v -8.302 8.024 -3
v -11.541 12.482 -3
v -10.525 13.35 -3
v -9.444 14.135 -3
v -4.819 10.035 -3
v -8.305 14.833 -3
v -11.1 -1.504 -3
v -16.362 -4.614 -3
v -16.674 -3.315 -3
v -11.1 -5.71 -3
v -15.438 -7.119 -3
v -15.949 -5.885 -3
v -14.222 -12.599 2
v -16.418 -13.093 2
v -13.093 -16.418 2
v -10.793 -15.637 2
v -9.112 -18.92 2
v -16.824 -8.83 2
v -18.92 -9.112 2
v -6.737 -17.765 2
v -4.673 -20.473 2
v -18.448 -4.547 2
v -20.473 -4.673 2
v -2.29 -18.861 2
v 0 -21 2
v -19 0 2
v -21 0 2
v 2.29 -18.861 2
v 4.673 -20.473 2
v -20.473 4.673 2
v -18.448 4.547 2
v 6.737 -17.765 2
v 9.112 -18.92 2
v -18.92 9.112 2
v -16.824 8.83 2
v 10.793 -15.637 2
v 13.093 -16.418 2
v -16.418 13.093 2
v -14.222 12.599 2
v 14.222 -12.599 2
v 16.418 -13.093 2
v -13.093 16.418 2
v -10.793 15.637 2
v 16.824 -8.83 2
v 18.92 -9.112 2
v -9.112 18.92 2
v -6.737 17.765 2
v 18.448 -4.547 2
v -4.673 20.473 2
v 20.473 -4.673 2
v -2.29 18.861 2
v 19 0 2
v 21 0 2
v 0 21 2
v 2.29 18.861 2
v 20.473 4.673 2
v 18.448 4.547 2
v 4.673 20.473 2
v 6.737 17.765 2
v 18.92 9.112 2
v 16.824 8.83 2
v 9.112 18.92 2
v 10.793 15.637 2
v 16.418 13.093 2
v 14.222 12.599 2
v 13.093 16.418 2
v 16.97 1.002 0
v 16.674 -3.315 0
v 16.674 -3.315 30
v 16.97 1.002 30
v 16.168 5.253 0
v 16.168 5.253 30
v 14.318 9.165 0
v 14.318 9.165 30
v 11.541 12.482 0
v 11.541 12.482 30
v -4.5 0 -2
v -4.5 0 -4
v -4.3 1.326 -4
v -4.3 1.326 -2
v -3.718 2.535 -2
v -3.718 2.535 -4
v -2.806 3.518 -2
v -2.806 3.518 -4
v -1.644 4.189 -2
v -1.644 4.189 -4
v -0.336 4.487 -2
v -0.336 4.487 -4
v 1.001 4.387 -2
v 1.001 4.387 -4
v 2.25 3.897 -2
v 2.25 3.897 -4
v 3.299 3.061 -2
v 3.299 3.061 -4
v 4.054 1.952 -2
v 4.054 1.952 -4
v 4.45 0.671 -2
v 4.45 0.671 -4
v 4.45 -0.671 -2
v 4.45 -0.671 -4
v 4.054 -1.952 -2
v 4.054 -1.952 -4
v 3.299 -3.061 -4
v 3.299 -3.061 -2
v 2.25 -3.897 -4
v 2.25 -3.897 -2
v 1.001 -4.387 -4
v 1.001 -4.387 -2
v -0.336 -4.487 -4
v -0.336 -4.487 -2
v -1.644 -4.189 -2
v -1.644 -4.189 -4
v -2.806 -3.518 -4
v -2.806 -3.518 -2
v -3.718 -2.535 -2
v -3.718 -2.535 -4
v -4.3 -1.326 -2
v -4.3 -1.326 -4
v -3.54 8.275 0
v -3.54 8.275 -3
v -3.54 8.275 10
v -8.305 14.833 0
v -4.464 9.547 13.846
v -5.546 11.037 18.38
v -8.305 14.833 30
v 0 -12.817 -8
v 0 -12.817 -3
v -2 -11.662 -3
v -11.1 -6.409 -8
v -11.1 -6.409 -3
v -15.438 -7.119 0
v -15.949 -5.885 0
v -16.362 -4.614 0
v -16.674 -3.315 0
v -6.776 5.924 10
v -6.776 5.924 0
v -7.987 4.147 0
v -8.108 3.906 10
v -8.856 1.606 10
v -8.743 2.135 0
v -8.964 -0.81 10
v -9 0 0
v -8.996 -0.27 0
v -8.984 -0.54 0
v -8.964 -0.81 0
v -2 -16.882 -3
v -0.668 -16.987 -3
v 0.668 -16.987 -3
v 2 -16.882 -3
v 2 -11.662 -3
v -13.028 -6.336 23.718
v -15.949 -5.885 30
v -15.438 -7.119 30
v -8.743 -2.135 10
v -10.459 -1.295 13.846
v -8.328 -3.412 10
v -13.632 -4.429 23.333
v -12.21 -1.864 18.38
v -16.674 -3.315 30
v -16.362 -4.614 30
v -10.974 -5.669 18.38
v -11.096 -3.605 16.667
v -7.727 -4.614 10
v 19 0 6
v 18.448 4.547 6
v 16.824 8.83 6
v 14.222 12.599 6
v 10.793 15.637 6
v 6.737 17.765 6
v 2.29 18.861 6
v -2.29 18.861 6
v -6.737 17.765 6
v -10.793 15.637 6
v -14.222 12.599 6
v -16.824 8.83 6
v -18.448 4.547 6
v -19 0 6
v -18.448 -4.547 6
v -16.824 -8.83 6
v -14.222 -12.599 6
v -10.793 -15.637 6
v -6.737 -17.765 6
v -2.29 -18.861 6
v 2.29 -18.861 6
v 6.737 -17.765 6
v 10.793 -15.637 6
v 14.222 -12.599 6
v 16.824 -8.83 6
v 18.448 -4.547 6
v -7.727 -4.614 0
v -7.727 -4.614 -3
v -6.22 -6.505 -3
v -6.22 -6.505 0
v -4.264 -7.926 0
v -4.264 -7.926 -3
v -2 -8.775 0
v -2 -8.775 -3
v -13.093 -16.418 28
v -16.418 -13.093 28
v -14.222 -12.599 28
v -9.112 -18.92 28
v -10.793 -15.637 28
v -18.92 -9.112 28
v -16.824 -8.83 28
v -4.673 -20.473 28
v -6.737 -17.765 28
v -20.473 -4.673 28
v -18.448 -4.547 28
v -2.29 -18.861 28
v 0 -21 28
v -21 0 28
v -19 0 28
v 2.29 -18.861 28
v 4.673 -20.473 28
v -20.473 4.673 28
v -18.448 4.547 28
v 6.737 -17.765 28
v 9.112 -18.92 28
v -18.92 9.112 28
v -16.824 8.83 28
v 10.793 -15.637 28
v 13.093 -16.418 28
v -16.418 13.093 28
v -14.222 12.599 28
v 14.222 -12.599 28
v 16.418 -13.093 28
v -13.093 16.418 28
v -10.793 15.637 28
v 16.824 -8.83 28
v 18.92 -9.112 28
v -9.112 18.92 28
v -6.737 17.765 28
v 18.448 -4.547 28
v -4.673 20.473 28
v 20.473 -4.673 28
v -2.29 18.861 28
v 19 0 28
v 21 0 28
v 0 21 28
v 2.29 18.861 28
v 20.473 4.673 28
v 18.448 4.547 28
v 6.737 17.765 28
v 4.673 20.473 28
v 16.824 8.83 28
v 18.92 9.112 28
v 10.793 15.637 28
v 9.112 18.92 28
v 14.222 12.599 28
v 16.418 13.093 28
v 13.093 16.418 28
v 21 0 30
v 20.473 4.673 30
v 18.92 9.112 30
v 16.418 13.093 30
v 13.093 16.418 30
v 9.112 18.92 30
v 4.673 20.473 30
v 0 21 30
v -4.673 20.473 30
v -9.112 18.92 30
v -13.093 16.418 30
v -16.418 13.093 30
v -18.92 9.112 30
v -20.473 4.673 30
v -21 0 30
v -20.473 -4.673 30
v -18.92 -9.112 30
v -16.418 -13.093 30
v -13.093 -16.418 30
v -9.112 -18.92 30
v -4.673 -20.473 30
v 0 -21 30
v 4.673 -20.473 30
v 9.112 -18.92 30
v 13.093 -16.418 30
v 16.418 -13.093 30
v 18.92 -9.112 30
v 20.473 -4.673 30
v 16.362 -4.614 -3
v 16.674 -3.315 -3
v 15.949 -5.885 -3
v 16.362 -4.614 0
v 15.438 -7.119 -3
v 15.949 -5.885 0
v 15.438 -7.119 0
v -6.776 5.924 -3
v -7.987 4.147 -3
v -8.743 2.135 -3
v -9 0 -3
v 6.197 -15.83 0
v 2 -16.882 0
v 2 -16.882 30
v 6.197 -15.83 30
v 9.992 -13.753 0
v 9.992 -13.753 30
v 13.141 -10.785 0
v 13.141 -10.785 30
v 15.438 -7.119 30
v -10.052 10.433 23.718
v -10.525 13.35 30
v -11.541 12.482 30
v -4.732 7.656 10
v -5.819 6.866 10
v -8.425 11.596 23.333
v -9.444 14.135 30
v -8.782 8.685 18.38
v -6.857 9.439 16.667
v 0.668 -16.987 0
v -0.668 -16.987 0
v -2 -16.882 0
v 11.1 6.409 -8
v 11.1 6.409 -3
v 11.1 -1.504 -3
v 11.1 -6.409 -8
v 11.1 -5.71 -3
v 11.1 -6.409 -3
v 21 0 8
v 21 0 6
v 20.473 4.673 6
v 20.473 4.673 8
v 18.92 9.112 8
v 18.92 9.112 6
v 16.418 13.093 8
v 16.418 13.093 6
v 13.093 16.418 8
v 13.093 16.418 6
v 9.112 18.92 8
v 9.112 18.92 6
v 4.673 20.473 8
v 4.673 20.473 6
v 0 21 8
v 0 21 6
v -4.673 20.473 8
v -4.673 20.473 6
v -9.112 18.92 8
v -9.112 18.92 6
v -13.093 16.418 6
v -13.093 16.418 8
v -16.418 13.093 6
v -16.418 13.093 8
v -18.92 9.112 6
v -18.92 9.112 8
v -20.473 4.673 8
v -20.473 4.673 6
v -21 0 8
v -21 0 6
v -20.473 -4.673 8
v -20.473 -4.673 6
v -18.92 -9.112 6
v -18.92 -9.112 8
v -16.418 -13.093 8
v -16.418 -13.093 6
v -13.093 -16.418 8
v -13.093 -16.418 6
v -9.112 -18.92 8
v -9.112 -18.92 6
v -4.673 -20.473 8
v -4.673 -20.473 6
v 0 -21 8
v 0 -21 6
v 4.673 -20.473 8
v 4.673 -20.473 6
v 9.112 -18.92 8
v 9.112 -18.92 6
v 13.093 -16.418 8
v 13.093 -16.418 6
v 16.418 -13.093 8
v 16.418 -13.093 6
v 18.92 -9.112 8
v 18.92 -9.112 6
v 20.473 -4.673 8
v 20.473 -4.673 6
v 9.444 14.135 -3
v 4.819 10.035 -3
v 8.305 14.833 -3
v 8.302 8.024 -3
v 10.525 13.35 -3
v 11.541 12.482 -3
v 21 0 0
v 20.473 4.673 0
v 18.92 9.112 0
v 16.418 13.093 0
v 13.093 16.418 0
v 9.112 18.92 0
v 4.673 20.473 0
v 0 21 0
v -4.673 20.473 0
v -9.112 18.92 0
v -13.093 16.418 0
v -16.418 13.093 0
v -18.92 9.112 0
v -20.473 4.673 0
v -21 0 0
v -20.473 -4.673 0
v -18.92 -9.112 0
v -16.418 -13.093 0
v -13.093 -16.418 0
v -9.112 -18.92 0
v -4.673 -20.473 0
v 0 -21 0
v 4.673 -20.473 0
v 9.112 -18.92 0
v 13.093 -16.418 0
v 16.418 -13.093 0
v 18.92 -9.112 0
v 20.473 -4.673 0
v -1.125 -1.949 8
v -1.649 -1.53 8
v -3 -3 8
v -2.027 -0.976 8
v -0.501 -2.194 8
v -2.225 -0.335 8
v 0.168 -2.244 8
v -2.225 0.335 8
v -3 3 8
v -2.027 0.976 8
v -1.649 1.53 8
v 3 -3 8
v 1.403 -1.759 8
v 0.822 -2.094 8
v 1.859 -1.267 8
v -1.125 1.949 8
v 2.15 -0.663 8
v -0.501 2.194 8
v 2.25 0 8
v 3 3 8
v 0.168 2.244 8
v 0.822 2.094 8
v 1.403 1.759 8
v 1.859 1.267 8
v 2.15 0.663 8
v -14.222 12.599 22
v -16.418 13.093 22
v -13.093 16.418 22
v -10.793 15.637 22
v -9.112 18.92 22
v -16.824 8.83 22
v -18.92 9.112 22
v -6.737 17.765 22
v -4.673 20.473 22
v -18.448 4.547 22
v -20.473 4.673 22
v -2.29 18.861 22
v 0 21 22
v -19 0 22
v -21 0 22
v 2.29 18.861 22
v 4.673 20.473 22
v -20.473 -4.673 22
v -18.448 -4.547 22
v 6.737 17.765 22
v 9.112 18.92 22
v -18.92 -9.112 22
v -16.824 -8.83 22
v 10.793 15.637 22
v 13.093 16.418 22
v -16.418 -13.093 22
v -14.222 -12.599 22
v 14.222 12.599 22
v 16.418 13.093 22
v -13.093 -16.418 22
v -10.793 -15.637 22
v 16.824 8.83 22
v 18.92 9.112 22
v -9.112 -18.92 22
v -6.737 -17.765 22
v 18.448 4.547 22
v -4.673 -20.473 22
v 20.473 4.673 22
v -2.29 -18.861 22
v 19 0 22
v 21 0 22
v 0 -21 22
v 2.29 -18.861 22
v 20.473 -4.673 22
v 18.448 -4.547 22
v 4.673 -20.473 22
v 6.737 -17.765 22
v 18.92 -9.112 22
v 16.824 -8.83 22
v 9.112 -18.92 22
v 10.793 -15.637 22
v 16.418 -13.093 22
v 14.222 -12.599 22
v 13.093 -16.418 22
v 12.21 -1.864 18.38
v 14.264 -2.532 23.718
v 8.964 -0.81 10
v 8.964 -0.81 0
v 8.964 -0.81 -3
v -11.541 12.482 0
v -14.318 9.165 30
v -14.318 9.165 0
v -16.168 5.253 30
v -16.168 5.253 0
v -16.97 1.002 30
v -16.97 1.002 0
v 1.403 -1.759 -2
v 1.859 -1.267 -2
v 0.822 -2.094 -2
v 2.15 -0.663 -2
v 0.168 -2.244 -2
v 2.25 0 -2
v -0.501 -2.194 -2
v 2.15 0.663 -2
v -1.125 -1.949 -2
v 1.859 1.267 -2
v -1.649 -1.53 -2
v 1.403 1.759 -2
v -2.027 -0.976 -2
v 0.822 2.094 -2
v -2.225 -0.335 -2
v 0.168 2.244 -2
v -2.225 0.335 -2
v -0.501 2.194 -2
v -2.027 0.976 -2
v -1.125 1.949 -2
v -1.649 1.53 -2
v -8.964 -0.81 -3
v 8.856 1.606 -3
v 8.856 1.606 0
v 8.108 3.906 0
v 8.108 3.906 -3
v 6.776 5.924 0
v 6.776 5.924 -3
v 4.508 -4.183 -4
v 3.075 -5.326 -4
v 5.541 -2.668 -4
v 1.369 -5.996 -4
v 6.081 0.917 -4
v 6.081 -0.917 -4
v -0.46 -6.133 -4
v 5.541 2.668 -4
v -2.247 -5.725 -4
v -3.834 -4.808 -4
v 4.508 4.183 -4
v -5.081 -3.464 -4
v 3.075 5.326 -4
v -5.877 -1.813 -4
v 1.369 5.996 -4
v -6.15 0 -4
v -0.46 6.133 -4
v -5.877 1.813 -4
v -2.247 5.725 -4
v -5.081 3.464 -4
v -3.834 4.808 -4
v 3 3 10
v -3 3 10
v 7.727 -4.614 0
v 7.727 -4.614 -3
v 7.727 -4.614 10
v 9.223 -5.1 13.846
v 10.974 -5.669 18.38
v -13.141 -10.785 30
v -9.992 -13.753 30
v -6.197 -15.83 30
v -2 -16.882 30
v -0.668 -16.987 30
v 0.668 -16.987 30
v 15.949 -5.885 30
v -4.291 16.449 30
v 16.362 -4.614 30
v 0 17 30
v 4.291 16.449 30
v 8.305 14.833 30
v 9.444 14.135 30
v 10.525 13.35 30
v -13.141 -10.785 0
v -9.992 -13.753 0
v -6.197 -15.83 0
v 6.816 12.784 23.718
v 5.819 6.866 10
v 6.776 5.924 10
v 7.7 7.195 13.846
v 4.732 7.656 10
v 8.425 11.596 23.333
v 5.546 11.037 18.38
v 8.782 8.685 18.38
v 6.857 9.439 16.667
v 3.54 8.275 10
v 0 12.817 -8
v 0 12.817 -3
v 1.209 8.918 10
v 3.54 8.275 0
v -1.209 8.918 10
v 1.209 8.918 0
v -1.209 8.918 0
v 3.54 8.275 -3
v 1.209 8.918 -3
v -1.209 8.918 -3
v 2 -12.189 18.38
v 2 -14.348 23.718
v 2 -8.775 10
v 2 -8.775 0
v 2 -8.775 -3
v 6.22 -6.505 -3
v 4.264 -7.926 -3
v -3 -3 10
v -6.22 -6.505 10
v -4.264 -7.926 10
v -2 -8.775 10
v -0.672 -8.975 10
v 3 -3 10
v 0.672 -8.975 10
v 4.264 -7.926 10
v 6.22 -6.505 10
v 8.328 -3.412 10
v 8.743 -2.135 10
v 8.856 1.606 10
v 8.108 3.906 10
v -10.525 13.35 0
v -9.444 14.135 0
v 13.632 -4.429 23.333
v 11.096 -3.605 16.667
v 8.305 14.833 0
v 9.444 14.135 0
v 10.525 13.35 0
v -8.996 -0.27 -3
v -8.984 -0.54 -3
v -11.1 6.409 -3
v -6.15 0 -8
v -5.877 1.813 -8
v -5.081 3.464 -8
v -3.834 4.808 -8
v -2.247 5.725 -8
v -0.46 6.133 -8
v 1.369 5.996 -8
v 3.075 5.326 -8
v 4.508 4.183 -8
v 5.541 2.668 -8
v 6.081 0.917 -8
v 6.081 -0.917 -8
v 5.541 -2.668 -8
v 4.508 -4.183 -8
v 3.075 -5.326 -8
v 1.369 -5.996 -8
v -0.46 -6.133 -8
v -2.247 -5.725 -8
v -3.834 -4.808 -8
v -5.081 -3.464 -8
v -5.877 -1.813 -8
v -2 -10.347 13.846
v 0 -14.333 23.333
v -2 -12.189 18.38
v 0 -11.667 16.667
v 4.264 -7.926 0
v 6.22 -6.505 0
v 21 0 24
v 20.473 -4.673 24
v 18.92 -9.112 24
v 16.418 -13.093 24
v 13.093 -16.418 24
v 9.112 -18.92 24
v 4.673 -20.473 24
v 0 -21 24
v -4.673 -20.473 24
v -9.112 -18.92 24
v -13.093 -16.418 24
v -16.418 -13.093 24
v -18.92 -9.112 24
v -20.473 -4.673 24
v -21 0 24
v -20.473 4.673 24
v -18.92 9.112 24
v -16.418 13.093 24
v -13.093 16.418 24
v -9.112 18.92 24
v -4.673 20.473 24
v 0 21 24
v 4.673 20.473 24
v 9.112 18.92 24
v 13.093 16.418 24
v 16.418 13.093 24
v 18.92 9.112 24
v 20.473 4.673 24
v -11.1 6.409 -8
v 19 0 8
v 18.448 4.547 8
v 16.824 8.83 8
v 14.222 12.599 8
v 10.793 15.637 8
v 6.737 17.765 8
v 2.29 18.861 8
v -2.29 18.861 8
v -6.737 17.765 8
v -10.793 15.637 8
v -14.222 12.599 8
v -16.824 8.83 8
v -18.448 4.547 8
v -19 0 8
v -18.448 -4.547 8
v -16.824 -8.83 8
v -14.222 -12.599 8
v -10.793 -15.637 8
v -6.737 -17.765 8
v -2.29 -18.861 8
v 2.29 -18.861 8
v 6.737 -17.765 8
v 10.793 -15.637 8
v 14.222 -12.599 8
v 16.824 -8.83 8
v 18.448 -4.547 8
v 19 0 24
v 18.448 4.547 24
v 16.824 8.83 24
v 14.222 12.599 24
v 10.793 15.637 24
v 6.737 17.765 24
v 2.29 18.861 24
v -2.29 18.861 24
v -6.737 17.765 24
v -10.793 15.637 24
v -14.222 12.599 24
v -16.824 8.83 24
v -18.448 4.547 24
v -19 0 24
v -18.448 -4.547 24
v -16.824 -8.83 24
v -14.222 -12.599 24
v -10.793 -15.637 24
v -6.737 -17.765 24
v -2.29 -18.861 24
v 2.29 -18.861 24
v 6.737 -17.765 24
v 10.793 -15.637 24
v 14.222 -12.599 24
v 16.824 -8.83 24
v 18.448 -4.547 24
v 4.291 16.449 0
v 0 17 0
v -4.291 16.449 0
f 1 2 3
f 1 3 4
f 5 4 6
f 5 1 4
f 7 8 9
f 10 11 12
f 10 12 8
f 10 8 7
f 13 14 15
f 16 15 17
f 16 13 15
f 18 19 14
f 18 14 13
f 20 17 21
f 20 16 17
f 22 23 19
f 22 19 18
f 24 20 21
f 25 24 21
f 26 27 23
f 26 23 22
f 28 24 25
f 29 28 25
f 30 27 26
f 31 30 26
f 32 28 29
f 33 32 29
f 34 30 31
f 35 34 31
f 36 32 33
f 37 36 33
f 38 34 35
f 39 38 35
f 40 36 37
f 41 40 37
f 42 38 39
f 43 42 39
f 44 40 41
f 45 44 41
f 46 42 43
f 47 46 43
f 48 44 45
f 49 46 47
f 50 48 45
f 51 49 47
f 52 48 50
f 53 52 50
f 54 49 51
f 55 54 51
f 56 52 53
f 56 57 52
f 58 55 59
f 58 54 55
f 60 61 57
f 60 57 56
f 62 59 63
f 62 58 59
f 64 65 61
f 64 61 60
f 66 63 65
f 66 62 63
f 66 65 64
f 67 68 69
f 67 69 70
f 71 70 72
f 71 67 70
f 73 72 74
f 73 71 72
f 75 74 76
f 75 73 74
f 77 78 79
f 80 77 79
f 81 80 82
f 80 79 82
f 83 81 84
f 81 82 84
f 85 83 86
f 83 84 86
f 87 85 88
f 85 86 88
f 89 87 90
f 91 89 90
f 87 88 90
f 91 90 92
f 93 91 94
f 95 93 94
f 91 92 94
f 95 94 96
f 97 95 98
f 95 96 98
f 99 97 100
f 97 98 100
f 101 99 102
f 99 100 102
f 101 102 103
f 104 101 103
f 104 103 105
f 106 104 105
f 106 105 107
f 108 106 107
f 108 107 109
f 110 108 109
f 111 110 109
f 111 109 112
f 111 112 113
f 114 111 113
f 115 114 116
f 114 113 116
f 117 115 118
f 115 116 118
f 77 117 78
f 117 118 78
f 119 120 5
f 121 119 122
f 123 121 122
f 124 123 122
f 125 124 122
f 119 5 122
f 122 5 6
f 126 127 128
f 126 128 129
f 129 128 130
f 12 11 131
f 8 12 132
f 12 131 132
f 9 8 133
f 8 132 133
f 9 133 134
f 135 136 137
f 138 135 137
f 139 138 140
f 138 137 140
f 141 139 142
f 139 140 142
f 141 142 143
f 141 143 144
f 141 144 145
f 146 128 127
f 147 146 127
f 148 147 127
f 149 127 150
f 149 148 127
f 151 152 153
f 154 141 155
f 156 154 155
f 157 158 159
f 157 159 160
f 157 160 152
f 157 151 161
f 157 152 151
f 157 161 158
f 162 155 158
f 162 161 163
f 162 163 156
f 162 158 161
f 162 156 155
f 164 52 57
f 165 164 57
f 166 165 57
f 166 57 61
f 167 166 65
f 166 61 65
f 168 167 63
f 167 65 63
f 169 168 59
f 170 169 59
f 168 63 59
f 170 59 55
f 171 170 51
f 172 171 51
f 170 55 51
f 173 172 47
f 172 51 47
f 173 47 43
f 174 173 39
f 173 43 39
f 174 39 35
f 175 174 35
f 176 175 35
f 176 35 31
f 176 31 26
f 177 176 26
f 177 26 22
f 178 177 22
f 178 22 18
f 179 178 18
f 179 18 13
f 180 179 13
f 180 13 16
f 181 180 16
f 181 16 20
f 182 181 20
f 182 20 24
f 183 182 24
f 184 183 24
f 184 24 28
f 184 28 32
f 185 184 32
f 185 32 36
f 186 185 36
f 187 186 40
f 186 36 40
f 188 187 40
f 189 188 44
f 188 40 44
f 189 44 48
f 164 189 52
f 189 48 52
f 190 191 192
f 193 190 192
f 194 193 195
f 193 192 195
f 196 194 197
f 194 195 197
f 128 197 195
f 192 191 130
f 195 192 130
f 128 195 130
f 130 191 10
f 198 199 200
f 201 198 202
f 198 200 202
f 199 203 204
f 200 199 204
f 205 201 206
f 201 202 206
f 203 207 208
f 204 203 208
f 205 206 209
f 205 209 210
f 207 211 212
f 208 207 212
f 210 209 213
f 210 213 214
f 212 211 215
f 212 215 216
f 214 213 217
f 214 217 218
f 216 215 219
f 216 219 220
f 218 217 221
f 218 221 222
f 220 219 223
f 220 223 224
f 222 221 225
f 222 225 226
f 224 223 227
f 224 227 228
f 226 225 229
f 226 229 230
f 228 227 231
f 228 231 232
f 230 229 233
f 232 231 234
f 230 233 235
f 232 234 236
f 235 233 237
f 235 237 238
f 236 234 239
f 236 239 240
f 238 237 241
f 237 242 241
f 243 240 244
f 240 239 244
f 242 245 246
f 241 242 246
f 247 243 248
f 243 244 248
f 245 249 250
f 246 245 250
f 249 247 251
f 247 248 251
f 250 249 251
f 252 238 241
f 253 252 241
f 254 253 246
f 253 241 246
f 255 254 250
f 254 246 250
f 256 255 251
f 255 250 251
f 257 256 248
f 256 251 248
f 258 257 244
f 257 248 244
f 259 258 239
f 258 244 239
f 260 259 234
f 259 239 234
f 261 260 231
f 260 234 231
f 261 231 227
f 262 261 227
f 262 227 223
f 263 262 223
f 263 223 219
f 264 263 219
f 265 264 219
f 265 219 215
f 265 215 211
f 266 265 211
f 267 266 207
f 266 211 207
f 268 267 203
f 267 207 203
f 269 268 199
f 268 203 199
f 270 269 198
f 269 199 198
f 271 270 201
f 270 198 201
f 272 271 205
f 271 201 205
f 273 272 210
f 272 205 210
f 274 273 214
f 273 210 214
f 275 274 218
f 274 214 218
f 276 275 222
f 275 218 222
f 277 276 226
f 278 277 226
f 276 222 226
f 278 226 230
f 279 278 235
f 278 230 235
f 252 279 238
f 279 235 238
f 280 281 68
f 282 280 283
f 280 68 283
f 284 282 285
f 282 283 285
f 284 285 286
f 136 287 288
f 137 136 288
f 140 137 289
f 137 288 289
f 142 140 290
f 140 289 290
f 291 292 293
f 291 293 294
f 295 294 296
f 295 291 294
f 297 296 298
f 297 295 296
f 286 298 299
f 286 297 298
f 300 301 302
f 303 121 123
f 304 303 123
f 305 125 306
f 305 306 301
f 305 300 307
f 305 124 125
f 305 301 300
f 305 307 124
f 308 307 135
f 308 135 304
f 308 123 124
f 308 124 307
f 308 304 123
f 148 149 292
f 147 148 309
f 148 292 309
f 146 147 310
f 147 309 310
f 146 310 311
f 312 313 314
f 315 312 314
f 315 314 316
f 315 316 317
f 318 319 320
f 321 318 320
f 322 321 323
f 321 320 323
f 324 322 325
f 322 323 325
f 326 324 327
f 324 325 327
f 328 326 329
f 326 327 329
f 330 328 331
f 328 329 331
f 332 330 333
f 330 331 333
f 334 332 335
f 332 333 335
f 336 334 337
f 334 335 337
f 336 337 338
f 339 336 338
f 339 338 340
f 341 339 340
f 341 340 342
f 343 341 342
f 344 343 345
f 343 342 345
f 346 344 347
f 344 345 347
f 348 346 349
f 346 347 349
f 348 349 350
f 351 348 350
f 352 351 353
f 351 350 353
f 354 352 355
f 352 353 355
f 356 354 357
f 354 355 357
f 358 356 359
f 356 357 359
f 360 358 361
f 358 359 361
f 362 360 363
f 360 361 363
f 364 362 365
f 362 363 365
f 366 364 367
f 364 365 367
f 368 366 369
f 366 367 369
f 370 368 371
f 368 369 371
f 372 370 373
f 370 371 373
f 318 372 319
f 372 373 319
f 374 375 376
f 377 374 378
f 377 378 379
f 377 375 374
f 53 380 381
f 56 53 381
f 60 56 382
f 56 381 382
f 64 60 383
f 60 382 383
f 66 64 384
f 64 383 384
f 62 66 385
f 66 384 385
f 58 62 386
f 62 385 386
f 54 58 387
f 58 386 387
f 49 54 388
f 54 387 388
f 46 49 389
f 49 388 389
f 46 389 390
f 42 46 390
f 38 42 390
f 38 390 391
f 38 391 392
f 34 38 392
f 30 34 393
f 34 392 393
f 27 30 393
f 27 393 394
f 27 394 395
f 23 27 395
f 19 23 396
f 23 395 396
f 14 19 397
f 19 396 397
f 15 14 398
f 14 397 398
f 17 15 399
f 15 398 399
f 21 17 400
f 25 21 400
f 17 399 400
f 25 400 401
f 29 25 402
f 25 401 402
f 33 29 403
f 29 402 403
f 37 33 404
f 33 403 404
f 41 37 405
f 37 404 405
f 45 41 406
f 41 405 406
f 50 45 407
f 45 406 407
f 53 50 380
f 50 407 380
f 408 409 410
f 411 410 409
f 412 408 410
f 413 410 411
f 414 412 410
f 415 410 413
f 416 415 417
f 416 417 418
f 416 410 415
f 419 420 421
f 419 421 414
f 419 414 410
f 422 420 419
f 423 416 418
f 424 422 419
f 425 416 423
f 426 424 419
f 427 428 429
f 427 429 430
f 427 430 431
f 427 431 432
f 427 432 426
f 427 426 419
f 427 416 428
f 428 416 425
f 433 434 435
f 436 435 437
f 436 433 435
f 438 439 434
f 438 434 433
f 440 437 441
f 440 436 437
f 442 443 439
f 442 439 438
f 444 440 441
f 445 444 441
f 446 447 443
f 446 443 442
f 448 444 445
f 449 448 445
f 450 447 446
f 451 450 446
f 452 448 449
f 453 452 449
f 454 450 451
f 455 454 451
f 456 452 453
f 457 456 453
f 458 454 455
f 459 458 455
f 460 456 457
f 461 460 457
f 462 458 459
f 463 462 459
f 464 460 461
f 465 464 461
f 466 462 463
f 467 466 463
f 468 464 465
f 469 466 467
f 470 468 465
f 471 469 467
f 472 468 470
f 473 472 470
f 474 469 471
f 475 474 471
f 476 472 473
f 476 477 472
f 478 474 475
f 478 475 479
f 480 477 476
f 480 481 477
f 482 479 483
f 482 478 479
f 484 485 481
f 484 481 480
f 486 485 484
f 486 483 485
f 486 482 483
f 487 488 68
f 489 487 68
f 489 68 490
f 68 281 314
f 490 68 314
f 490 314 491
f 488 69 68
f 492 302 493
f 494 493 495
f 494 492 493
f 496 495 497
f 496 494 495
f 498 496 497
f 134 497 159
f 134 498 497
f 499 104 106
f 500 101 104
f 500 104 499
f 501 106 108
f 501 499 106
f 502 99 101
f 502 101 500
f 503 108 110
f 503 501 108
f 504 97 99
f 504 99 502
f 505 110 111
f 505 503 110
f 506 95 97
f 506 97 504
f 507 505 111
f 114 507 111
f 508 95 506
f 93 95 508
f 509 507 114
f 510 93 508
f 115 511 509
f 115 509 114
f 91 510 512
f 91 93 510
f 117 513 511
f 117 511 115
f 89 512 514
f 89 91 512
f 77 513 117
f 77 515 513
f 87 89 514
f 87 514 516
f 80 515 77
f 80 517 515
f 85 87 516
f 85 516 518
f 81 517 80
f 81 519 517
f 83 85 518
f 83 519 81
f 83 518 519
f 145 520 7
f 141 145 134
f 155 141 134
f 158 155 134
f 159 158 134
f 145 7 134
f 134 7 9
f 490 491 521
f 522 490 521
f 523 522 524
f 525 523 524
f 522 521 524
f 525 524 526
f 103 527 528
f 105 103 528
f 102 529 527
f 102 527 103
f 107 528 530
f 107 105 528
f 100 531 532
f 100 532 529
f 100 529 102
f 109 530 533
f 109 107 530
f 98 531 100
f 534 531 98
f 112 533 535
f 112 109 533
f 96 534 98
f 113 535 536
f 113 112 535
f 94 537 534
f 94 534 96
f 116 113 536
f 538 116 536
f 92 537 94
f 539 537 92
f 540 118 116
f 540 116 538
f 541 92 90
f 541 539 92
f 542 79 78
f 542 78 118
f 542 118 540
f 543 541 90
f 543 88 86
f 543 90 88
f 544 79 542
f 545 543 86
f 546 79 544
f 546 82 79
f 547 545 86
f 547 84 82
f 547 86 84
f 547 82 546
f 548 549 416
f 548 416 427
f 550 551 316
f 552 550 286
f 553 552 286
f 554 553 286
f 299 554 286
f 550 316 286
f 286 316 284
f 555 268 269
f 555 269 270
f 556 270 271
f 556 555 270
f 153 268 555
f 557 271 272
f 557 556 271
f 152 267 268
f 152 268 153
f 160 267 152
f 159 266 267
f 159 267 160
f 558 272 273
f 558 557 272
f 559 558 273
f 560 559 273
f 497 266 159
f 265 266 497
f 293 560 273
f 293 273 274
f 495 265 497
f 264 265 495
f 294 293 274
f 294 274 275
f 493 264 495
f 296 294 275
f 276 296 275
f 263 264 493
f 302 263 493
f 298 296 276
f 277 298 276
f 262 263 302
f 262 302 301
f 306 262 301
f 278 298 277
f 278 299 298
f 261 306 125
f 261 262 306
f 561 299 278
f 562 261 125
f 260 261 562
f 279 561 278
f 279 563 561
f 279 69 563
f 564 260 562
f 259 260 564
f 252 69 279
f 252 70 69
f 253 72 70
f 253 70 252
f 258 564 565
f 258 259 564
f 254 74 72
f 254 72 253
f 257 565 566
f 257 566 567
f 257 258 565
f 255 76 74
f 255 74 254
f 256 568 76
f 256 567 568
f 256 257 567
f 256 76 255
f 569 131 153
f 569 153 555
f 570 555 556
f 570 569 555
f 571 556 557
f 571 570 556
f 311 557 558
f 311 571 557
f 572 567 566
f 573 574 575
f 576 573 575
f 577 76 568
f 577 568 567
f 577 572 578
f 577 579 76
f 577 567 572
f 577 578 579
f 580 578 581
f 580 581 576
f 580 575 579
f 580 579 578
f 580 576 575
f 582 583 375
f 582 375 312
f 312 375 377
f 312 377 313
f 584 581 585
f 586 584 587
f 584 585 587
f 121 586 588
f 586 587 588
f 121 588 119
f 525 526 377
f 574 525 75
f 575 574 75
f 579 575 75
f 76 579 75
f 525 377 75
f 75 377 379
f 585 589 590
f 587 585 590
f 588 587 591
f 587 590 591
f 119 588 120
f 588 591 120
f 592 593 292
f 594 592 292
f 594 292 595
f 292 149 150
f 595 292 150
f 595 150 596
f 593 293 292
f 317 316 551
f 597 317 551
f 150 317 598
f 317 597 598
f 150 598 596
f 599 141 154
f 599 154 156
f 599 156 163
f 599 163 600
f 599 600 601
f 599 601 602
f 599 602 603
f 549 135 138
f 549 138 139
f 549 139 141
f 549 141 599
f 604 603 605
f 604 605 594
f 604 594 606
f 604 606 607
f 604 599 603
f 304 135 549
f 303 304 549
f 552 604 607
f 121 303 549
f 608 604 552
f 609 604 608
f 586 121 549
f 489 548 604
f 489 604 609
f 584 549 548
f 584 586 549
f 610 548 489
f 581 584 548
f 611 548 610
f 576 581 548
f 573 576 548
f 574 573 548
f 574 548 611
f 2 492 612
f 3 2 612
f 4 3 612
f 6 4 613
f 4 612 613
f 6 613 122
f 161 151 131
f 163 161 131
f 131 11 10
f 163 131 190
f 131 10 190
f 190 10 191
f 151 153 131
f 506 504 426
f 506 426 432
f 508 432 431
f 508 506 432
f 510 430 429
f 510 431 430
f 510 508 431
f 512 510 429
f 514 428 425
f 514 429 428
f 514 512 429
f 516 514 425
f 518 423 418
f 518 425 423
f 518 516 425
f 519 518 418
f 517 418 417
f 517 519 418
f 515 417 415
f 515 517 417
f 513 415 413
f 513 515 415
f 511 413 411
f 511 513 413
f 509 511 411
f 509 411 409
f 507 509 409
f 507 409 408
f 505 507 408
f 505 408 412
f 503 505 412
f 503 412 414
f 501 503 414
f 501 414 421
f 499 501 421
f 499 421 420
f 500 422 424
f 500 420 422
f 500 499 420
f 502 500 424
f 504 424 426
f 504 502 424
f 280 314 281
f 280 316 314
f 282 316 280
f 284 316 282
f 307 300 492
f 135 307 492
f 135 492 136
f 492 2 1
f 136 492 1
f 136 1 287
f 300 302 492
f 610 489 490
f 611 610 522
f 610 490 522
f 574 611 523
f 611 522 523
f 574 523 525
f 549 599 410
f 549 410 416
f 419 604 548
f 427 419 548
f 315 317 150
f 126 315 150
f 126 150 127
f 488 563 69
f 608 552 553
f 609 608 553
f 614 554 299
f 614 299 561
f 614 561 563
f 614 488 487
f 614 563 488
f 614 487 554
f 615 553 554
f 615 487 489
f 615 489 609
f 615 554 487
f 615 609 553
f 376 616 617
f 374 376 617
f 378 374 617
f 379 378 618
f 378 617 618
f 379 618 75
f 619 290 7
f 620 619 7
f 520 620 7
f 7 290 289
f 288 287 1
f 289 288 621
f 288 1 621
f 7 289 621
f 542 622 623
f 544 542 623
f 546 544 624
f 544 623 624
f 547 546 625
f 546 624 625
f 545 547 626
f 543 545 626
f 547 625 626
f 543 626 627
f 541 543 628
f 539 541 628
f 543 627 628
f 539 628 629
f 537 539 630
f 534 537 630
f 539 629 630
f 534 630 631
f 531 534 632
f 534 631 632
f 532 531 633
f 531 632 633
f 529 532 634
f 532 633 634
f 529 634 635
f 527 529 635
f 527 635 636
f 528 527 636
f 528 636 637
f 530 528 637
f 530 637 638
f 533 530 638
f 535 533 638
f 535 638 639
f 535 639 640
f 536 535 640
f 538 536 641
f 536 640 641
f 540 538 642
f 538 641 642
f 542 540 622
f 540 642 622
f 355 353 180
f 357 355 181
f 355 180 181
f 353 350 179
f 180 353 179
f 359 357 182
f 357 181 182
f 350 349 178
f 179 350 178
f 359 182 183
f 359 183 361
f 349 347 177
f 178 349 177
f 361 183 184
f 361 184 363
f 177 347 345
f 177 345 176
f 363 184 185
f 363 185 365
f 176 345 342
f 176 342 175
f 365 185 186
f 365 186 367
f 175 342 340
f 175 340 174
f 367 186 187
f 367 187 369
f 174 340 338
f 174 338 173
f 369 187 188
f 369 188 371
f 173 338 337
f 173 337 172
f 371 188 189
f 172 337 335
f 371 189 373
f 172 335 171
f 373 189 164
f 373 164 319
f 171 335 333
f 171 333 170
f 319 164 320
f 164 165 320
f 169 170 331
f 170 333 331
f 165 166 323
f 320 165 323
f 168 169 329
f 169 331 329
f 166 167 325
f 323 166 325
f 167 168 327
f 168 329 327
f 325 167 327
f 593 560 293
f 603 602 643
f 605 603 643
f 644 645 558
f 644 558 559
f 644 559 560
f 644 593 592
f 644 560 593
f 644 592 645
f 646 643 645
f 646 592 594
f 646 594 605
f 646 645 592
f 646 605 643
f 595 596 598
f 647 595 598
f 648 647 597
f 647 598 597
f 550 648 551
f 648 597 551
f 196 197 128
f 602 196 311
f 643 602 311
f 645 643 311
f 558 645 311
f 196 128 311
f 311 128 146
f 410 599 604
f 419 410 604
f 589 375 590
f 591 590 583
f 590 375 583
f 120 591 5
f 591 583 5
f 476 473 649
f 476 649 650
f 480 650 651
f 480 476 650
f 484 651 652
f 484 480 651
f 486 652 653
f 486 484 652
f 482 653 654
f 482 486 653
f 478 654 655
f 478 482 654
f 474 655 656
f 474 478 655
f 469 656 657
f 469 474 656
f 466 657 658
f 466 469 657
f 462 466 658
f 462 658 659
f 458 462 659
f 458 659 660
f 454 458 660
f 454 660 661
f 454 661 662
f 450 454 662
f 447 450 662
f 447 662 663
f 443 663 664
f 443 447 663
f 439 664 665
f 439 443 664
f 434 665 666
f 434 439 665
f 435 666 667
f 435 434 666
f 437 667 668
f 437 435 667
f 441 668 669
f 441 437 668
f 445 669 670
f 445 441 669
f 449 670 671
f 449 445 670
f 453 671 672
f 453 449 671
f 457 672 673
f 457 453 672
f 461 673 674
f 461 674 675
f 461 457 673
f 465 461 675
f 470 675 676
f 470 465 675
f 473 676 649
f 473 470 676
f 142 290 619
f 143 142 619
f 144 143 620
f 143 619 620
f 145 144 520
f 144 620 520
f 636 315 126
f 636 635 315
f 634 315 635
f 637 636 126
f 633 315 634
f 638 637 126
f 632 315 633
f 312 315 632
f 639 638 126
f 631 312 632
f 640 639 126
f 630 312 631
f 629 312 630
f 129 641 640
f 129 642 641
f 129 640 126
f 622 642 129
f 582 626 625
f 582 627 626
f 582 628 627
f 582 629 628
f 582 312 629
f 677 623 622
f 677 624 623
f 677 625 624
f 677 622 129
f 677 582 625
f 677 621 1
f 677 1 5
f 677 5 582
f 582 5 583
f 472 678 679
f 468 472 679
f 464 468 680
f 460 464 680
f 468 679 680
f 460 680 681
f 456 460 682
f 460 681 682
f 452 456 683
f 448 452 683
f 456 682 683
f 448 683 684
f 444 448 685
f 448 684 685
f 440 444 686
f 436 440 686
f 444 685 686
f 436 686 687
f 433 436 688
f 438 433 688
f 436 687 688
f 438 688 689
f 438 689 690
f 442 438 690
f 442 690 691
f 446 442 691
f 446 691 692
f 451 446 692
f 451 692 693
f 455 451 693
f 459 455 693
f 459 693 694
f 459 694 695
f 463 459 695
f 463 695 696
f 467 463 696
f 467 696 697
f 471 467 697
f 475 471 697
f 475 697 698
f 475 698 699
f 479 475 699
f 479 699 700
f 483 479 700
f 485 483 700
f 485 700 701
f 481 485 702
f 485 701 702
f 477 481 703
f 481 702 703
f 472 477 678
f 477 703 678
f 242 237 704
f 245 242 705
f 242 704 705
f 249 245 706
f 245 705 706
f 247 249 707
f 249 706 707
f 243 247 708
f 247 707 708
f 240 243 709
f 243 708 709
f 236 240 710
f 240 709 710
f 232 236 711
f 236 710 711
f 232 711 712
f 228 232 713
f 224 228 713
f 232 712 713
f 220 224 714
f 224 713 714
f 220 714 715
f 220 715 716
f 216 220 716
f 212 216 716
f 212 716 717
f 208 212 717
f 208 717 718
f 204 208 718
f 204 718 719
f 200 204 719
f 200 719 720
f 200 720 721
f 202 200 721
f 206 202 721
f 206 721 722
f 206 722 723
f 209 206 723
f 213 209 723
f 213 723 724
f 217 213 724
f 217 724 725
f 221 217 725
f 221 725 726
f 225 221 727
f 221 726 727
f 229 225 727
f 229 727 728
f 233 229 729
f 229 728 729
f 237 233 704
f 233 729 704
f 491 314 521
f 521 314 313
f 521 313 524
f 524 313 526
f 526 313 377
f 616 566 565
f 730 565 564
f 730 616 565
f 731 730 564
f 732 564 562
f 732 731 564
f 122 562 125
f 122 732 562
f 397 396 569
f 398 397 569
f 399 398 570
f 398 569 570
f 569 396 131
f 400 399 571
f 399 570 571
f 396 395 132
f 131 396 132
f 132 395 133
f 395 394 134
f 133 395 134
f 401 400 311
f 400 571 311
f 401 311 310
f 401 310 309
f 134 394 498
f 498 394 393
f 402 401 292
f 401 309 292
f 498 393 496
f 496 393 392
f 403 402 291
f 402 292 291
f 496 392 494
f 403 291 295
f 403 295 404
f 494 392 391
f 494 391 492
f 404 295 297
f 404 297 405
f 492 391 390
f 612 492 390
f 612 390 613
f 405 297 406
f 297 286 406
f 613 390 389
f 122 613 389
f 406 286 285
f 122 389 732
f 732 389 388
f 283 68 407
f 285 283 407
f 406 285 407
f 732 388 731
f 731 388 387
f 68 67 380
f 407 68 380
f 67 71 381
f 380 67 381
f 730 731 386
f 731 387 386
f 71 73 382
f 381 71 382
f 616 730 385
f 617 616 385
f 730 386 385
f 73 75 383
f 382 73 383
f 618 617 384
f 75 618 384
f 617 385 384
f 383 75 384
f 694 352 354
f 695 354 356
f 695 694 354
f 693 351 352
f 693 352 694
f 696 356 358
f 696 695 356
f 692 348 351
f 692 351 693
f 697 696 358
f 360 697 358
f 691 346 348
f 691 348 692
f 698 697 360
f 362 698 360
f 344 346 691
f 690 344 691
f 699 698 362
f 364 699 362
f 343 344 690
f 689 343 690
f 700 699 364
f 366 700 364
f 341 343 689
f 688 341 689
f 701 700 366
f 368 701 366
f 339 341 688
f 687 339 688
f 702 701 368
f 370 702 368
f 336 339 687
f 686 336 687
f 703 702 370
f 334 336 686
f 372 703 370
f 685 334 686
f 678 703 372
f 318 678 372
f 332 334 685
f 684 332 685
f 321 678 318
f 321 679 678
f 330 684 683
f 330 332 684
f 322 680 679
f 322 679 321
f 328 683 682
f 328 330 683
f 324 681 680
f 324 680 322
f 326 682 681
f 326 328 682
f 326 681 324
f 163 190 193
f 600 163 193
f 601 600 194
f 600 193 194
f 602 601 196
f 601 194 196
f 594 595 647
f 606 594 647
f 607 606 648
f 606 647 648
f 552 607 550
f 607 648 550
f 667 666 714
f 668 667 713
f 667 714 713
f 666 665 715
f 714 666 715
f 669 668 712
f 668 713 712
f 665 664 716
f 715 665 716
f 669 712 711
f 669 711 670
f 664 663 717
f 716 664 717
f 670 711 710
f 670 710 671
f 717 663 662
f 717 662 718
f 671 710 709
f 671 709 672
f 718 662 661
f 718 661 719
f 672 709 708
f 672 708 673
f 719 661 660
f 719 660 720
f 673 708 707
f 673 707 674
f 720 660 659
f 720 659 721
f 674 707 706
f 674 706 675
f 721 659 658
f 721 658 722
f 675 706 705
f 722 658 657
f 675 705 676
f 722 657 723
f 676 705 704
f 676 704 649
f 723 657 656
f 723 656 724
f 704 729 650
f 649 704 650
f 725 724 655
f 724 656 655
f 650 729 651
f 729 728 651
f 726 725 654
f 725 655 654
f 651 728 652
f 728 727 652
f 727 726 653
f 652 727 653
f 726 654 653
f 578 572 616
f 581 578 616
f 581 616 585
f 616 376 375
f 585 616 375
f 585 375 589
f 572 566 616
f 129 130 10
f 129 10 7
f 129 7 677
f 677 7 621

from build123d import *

# Parameters (mm, degrees)
SKETCH_1_R           = 19
SKETCH_1_R_2         = 17
EXTRUDE_1_DEPTH      = 30
SKETCH_16_R          = 17
EXTRUDE_9_DEPTH      = 3
SKETCH_4_R           = 9
EXTRUDE_2_DEPTH      = 10
CUT_EXTRUDE_8_DEPTH  = 10
EXTRUDE_10_DEPTH     = 30
SKETCH_6_R           = 2.25
CUT_EXTRUDE_9_DEPTH  = 70
SKETCH_9_R           = 21
SKETCH_9_R_2         = 19
EXTRUDE_4_DEPTH      = 2
SKETCH_10_R          = 21
SKETCH_10_R_2        = 19
EXTRUDE_5_DEPTH      = 2
EXTRUDE_START        = -2
SKETCH_11_R          = 21
SKETCH_11_R_2        = 19
EXTRUDE_6_DEPTH      = 2
EXTRUDE_START_2      = 2
SKETCH_12_R          = 21
SKETCH_12_R_2        = 19
EXTRUDE_7_DEPTH      = 2
SKETCH_13_W          = 6
SKETCH_13_H          = 6
CUT_EXTRUDE_5_DEPTH  = 2
SKETCH_14_R          = 2.15
EXTRUDE_11_DEPTH     = 5
SKETCH_22_R          = 6.15
CUT_EXTRUDE_10_DEPTH = 4
SKETCH_25_R          = 4.5
CUT_EXTRUDE_11_DEPTH = 2


with BuildPart() as part:
    # 草图1 → 凸台-拉伸1 (new body)
    with BuildSketch(Plane.XY):
        Circle(SKETCH_1_R)
        Circle(SKETCH_1_R_2, mode=Mode.SUBTRACT)
    extrude(amount=EXTRUDE_1_DEPTH)



with BuildPart() as body_2:
    # 草图16 → 凸台-拉伸9 (new body)
    with BuildSketch(Plane(origin=(0, 0, 0), x_dir=(-1, 0, 0), z_dir=(0, 0, -1))):
        with Locations(Location((0, 0, 0), (0, 0, 180))):
            Circle(SKETCH_16_R)
    extrude(amount=EXTRUDE_9_DEPTH)

    # 草图7 → 切除-拉伸8 (cut)
    with BuildSketch(Plane(origin=(0, 0, -3), x_dir=(-1, 0, 0), z_dir=(0, 0, -1))):
        with BuildLine():
            Line((-8.304923146, 14.833349303), (-3.539760668, 8.274665819))
            ThreePointArc((-3.539760668, 8.274665819), (0, 9), (3.539760668, 8.274665819))
            Line((3.539760668, 8.274665819), (8.304923146, 14.833349303))
            ThreePointArc((8.304923146, 14.833349303), (0, 17), (-8.304923146, 14.833349303))
        make_face()
        with BuildLine():
            ThreePointArc((9, 0), (8.990875637, -0.405160803), (8.96352105, -0.809500088))
            Line((8.96352105, -0.809500088), (16.673715902, -3.314694257))
            ThreePointArc((16.673715902, -3.314694257), (16.91823233, -1.665357269), (17, 0))
            ThreePointArc((17, 0), (15.575571404, 6.811870187), (11.540991124, 12.482208294))
            Line((11.540991124, 12.482208294), (6.775828645, 5.92352481))
            ThreePointArc((6.775828645, 5.92352481), (8.425629288, 3.163664188), (9, 0))
        make_face()
        with BuildLine():
            ThreePointArc((7.727453072, -4.613726153), (5.290067271, -7.281152949), (2, -8.774964387))
            Line((2, -8.774964387), (2, -16.881943016))
            ThreePointArc((2, -16.881943016), (9.992349289, -13.753288904), (15.437647924, -7.118920323))
            Line((15.437647924, -7.118920323), (7.727453072, -4.613726153))
        make_face()
        with BuildLine():
            Line((-2, -16.881943016), (-2, -8.774964387))
            ThreePointArc((-2, -8.774964387), (-5.290067271, -7.281152949), (-7.727453072, -4.613726153))
            Line((-7.727453072, -4.613726153), (-15.437647924, -7.118920323))
            ThreePointArc((-15.437647924, -7.118920323), (-9.992349289, -13.753288904), (-2, -16.881943016))
        make_face()
        with BuildLine():
            Line((-16.673715902, -3.314694257), (-8.96352105, -0.809500088))
            ThreePointArc((-8.96352105, -0.809500088), (-8.559508647, 2.781152949), (-6.775828645, 5.92352481))
            Line((-6.775828645, 5.92352481), (-11.540991124, 12.482208294))
            ThreePointArc((-11.540991124, 12.482208294), (-16.167960777, 5.253288904), (-16.673715902, -3.314694257))
        make_face()
    extrude(amount=-CUT_EXTRUDE_8_DEPTH, mode=Mode.SUBTRACT)


with BuildPart() as body_3:
    # 草图4 → 凸台-拉伸2 (new body)
    with BuildSketch(Plane.XY):
        Circle(SKETCH_4_R)
    extrude(amount=EXTRUDE_2_DEPTH)


with BuildPart() as part_1:
    add(part.part)

    add(body_2.part)  # 凸台-拉伸10 merges body 2

    add(body_3.part)  # 凸台-拉伸10 merges body 3
    # 草图21 → 凸台-拉伸10 (add)
    with BuildSketch(Plane.XY):
        with BuildLine():
            ThreePointArc((-6.775828645, 5.92352481), (-5.290067271, 7.281152949), (-3.539760668, 8.274665819))
            Line((-3.539760668, 8.274665819), (-8.304923146, 14.833349303))
            ThreePointArc((-8.304923146, 14.833349303), (-9.992349289, 13.753288904), (-11.540991124, 12.482208294))
            Line((-11.540991124, 12.482208294), (-6.775828645, 5.92352481))
        make_face()
        with BuildLine():
            Line((8.304923146, 14.833349303), (3.539760668, 8.274665819))
            ThreePointArc((3.539760668, 8.274665819), (5.290067271, 7.281152949), (6.775828645, 5.92352481))
            Line((6.775828645, 5.92352481), (11.540991124, 12.482208294))
            ThreePointArc((11.540991124, 12.482208294), (9.992349289, 13.753288904), (8.304923146, 14.833349303))
        make_face()
        with BuildLine():
            Line((16.673715902, -3.314694257), (8.96352105, -0.809500088))
            ThreePointArc((8.96352105, -0.809500088), (8.559508647, -2.781152949), (7.727453072, -4.613726153))
            Line((7.727453072, -4.613726153), (15.437647924, -7.118920323))
            ThreePointArc((15.437647924, -7.118920323), (16.167960777, -5.253288904), (16.673715902, -3.314694257))
        make_face()
        with BuildLine():
            Line((2, -16.881943016), (2, -8.774964387))
            ThreePointArc((2, -8.774964387), (0, -9), (-2, -8.774964387))
            Line((-2, -8.774964387), (-2, -16.881943016))
            ThreePointArc((-2, -16.881943016), (0, -17), (2, -16.881943016))
        make_face()
        with BuildLine():
            ThreePointArc((-7.727453072, -4.613726153), (-8.559508647, -2.781152949), (-8.96352105, -0.809500088))
            Line((-8.96352105, -0.809500088), (-16.673715902, -3.314694257))
            ThreePointArc((-16.673715902, -3.314694257), (-16.167960777, -5.253288904), (-15.437647924, -7.118920323))
            Line((-15.437647924, -7.118920323), (-7.727453072, -4.613726153))
        make_face()
    extrude(amount=EXTRUDE_10_DEPTH)

    # 草图6 → 切除-拉伸9 (cut)
    with BuildSketch(Plane.XY.offset(-3)):
        Circle(SKETCH_6_R)
    extrude(amount=CUT_EXTRUDE_9_DEPTH, mode=Mode.SUBTRACT)

    # 草图9 → 凸台-拉伸4 (add)
    with BuildSketch(Plane.XY):
        Circle(SKETCH_9_R)
        Circle(SKETCH_9_R_2, mode=Mode.SUBTRACT)
    extrude(amount=EXTRUDE_4_DEPTH)

    # 草图10 → 凸台-拉伸5 (add)
    with BuildSketch(Plane.XY.offset(6)):
        Circle(SKETCH_10_R)
        Circle(SKETCH_10_R_2, mode=Mode.SUBTRACT)
    extrude(amount=EXTRUDE_5_DEPTH)

    # 草图11 → 凸台-拉伸6 (add)
    with BuildSketch(Plane.XY.offset(30).offset(EXTRUDE_START)):
        Circle(SKETCH_11_R)
        Circle(SKETCH_11_R_2, mode=Mode.SUBTRACT)
    extrude(amount=EXTRUDE_6_DEPTH)

    # 草图12 → 凸台-拉伸7 (add)
    with BuildSketch(Plane(origin=(0, 0, 24), x_dir=(-1, 0, 0), z_dir=(0, 0, -1)).offset(EXTRUDE_START_2)):
        with Locations(Location((0, 0, 0), (0, 0, 180))):
            Circle(SKETCH_12_R)
        Circle(SKETCH_12_R_2, mode=Mode.SUBTRACT)
    extrude(amount=-EXTRUDE_7_DEPTH)

    # 草图13 → 切除-拉伸5 (cut)
    with BuildSketch(Plane.XY.offset(10)):
        Rectangle(SKETCH_13_W, SKETCH_13_H)
    extrude(amount=-CUT_EXTRUDE_5_DEPTH, mode=Mode.SUBTRACT)

    # 草图14 → 凸台-拉伸11 (add)
    with BuildSketch(Plane(origin=(0, 0, -3), x_dir=(-1, 0, 0), z_dir=(0, 0, -1))):
        Polygon((-11.1, -6.408587988), (0, -12.817175976), (11.1, -6.408587988), (11.1, 6.408587988), (0, 12.817175976), (-11.1, 6.408587988), align=None)
        Circle(SKETCH_14_R, mode=Mode.SUBTRACT)
    extrude(amount=EXTRUDE_11_DEPTH)

    # 草图22 → 切除-拉伸10 (cut)
    with BuildSketch(Plane(origin=(0, 0, -8), x_dir=(-1, 0, 0), z_dir=(0, 0, -1))):
        Circle(SKETCH_22_R)
    extrude(amount=-CUT_EXTRUDE_10_DEPTH, mode=Mode.SUBTRACT)

    # 草图25 → 切除-拉伸11 (cut)
    with BuildSketch(Plane(origin=(0, 0, -4), x_dir=(-1, 0, 0), z_dir=(0, 0, -1))):
        Circle(SKETCH_25_R)
    extrude(amount=-CUT_EXTRUDE_11_DEPTH, mode=Mode.SUBTRACT)

    # 草图28 → 切除-旋转1 (revolve, cut)
    with BuildSketch(Plane(origin=(0, 0, 0), x_dir=(0.9510565162951539, -0.3090169943749465, 0), z_dir=(-0.3090169943749465, -0.9510565162951539, 0)), mode=Mode.PRIVATE) as cut_revolve_1_sk:
        Polygon((17, 30), (9, 10), (9, 30), align=None)
    revolve(cut_revolve_1_sk.sketch.rotate(Axis((0, 0, 0), (0, 0, 1)), 198), axis=Axis((0, 0, 0), (0, 0, 1)), mode=Mode.SUBTRACT)


solid = part_1.part
